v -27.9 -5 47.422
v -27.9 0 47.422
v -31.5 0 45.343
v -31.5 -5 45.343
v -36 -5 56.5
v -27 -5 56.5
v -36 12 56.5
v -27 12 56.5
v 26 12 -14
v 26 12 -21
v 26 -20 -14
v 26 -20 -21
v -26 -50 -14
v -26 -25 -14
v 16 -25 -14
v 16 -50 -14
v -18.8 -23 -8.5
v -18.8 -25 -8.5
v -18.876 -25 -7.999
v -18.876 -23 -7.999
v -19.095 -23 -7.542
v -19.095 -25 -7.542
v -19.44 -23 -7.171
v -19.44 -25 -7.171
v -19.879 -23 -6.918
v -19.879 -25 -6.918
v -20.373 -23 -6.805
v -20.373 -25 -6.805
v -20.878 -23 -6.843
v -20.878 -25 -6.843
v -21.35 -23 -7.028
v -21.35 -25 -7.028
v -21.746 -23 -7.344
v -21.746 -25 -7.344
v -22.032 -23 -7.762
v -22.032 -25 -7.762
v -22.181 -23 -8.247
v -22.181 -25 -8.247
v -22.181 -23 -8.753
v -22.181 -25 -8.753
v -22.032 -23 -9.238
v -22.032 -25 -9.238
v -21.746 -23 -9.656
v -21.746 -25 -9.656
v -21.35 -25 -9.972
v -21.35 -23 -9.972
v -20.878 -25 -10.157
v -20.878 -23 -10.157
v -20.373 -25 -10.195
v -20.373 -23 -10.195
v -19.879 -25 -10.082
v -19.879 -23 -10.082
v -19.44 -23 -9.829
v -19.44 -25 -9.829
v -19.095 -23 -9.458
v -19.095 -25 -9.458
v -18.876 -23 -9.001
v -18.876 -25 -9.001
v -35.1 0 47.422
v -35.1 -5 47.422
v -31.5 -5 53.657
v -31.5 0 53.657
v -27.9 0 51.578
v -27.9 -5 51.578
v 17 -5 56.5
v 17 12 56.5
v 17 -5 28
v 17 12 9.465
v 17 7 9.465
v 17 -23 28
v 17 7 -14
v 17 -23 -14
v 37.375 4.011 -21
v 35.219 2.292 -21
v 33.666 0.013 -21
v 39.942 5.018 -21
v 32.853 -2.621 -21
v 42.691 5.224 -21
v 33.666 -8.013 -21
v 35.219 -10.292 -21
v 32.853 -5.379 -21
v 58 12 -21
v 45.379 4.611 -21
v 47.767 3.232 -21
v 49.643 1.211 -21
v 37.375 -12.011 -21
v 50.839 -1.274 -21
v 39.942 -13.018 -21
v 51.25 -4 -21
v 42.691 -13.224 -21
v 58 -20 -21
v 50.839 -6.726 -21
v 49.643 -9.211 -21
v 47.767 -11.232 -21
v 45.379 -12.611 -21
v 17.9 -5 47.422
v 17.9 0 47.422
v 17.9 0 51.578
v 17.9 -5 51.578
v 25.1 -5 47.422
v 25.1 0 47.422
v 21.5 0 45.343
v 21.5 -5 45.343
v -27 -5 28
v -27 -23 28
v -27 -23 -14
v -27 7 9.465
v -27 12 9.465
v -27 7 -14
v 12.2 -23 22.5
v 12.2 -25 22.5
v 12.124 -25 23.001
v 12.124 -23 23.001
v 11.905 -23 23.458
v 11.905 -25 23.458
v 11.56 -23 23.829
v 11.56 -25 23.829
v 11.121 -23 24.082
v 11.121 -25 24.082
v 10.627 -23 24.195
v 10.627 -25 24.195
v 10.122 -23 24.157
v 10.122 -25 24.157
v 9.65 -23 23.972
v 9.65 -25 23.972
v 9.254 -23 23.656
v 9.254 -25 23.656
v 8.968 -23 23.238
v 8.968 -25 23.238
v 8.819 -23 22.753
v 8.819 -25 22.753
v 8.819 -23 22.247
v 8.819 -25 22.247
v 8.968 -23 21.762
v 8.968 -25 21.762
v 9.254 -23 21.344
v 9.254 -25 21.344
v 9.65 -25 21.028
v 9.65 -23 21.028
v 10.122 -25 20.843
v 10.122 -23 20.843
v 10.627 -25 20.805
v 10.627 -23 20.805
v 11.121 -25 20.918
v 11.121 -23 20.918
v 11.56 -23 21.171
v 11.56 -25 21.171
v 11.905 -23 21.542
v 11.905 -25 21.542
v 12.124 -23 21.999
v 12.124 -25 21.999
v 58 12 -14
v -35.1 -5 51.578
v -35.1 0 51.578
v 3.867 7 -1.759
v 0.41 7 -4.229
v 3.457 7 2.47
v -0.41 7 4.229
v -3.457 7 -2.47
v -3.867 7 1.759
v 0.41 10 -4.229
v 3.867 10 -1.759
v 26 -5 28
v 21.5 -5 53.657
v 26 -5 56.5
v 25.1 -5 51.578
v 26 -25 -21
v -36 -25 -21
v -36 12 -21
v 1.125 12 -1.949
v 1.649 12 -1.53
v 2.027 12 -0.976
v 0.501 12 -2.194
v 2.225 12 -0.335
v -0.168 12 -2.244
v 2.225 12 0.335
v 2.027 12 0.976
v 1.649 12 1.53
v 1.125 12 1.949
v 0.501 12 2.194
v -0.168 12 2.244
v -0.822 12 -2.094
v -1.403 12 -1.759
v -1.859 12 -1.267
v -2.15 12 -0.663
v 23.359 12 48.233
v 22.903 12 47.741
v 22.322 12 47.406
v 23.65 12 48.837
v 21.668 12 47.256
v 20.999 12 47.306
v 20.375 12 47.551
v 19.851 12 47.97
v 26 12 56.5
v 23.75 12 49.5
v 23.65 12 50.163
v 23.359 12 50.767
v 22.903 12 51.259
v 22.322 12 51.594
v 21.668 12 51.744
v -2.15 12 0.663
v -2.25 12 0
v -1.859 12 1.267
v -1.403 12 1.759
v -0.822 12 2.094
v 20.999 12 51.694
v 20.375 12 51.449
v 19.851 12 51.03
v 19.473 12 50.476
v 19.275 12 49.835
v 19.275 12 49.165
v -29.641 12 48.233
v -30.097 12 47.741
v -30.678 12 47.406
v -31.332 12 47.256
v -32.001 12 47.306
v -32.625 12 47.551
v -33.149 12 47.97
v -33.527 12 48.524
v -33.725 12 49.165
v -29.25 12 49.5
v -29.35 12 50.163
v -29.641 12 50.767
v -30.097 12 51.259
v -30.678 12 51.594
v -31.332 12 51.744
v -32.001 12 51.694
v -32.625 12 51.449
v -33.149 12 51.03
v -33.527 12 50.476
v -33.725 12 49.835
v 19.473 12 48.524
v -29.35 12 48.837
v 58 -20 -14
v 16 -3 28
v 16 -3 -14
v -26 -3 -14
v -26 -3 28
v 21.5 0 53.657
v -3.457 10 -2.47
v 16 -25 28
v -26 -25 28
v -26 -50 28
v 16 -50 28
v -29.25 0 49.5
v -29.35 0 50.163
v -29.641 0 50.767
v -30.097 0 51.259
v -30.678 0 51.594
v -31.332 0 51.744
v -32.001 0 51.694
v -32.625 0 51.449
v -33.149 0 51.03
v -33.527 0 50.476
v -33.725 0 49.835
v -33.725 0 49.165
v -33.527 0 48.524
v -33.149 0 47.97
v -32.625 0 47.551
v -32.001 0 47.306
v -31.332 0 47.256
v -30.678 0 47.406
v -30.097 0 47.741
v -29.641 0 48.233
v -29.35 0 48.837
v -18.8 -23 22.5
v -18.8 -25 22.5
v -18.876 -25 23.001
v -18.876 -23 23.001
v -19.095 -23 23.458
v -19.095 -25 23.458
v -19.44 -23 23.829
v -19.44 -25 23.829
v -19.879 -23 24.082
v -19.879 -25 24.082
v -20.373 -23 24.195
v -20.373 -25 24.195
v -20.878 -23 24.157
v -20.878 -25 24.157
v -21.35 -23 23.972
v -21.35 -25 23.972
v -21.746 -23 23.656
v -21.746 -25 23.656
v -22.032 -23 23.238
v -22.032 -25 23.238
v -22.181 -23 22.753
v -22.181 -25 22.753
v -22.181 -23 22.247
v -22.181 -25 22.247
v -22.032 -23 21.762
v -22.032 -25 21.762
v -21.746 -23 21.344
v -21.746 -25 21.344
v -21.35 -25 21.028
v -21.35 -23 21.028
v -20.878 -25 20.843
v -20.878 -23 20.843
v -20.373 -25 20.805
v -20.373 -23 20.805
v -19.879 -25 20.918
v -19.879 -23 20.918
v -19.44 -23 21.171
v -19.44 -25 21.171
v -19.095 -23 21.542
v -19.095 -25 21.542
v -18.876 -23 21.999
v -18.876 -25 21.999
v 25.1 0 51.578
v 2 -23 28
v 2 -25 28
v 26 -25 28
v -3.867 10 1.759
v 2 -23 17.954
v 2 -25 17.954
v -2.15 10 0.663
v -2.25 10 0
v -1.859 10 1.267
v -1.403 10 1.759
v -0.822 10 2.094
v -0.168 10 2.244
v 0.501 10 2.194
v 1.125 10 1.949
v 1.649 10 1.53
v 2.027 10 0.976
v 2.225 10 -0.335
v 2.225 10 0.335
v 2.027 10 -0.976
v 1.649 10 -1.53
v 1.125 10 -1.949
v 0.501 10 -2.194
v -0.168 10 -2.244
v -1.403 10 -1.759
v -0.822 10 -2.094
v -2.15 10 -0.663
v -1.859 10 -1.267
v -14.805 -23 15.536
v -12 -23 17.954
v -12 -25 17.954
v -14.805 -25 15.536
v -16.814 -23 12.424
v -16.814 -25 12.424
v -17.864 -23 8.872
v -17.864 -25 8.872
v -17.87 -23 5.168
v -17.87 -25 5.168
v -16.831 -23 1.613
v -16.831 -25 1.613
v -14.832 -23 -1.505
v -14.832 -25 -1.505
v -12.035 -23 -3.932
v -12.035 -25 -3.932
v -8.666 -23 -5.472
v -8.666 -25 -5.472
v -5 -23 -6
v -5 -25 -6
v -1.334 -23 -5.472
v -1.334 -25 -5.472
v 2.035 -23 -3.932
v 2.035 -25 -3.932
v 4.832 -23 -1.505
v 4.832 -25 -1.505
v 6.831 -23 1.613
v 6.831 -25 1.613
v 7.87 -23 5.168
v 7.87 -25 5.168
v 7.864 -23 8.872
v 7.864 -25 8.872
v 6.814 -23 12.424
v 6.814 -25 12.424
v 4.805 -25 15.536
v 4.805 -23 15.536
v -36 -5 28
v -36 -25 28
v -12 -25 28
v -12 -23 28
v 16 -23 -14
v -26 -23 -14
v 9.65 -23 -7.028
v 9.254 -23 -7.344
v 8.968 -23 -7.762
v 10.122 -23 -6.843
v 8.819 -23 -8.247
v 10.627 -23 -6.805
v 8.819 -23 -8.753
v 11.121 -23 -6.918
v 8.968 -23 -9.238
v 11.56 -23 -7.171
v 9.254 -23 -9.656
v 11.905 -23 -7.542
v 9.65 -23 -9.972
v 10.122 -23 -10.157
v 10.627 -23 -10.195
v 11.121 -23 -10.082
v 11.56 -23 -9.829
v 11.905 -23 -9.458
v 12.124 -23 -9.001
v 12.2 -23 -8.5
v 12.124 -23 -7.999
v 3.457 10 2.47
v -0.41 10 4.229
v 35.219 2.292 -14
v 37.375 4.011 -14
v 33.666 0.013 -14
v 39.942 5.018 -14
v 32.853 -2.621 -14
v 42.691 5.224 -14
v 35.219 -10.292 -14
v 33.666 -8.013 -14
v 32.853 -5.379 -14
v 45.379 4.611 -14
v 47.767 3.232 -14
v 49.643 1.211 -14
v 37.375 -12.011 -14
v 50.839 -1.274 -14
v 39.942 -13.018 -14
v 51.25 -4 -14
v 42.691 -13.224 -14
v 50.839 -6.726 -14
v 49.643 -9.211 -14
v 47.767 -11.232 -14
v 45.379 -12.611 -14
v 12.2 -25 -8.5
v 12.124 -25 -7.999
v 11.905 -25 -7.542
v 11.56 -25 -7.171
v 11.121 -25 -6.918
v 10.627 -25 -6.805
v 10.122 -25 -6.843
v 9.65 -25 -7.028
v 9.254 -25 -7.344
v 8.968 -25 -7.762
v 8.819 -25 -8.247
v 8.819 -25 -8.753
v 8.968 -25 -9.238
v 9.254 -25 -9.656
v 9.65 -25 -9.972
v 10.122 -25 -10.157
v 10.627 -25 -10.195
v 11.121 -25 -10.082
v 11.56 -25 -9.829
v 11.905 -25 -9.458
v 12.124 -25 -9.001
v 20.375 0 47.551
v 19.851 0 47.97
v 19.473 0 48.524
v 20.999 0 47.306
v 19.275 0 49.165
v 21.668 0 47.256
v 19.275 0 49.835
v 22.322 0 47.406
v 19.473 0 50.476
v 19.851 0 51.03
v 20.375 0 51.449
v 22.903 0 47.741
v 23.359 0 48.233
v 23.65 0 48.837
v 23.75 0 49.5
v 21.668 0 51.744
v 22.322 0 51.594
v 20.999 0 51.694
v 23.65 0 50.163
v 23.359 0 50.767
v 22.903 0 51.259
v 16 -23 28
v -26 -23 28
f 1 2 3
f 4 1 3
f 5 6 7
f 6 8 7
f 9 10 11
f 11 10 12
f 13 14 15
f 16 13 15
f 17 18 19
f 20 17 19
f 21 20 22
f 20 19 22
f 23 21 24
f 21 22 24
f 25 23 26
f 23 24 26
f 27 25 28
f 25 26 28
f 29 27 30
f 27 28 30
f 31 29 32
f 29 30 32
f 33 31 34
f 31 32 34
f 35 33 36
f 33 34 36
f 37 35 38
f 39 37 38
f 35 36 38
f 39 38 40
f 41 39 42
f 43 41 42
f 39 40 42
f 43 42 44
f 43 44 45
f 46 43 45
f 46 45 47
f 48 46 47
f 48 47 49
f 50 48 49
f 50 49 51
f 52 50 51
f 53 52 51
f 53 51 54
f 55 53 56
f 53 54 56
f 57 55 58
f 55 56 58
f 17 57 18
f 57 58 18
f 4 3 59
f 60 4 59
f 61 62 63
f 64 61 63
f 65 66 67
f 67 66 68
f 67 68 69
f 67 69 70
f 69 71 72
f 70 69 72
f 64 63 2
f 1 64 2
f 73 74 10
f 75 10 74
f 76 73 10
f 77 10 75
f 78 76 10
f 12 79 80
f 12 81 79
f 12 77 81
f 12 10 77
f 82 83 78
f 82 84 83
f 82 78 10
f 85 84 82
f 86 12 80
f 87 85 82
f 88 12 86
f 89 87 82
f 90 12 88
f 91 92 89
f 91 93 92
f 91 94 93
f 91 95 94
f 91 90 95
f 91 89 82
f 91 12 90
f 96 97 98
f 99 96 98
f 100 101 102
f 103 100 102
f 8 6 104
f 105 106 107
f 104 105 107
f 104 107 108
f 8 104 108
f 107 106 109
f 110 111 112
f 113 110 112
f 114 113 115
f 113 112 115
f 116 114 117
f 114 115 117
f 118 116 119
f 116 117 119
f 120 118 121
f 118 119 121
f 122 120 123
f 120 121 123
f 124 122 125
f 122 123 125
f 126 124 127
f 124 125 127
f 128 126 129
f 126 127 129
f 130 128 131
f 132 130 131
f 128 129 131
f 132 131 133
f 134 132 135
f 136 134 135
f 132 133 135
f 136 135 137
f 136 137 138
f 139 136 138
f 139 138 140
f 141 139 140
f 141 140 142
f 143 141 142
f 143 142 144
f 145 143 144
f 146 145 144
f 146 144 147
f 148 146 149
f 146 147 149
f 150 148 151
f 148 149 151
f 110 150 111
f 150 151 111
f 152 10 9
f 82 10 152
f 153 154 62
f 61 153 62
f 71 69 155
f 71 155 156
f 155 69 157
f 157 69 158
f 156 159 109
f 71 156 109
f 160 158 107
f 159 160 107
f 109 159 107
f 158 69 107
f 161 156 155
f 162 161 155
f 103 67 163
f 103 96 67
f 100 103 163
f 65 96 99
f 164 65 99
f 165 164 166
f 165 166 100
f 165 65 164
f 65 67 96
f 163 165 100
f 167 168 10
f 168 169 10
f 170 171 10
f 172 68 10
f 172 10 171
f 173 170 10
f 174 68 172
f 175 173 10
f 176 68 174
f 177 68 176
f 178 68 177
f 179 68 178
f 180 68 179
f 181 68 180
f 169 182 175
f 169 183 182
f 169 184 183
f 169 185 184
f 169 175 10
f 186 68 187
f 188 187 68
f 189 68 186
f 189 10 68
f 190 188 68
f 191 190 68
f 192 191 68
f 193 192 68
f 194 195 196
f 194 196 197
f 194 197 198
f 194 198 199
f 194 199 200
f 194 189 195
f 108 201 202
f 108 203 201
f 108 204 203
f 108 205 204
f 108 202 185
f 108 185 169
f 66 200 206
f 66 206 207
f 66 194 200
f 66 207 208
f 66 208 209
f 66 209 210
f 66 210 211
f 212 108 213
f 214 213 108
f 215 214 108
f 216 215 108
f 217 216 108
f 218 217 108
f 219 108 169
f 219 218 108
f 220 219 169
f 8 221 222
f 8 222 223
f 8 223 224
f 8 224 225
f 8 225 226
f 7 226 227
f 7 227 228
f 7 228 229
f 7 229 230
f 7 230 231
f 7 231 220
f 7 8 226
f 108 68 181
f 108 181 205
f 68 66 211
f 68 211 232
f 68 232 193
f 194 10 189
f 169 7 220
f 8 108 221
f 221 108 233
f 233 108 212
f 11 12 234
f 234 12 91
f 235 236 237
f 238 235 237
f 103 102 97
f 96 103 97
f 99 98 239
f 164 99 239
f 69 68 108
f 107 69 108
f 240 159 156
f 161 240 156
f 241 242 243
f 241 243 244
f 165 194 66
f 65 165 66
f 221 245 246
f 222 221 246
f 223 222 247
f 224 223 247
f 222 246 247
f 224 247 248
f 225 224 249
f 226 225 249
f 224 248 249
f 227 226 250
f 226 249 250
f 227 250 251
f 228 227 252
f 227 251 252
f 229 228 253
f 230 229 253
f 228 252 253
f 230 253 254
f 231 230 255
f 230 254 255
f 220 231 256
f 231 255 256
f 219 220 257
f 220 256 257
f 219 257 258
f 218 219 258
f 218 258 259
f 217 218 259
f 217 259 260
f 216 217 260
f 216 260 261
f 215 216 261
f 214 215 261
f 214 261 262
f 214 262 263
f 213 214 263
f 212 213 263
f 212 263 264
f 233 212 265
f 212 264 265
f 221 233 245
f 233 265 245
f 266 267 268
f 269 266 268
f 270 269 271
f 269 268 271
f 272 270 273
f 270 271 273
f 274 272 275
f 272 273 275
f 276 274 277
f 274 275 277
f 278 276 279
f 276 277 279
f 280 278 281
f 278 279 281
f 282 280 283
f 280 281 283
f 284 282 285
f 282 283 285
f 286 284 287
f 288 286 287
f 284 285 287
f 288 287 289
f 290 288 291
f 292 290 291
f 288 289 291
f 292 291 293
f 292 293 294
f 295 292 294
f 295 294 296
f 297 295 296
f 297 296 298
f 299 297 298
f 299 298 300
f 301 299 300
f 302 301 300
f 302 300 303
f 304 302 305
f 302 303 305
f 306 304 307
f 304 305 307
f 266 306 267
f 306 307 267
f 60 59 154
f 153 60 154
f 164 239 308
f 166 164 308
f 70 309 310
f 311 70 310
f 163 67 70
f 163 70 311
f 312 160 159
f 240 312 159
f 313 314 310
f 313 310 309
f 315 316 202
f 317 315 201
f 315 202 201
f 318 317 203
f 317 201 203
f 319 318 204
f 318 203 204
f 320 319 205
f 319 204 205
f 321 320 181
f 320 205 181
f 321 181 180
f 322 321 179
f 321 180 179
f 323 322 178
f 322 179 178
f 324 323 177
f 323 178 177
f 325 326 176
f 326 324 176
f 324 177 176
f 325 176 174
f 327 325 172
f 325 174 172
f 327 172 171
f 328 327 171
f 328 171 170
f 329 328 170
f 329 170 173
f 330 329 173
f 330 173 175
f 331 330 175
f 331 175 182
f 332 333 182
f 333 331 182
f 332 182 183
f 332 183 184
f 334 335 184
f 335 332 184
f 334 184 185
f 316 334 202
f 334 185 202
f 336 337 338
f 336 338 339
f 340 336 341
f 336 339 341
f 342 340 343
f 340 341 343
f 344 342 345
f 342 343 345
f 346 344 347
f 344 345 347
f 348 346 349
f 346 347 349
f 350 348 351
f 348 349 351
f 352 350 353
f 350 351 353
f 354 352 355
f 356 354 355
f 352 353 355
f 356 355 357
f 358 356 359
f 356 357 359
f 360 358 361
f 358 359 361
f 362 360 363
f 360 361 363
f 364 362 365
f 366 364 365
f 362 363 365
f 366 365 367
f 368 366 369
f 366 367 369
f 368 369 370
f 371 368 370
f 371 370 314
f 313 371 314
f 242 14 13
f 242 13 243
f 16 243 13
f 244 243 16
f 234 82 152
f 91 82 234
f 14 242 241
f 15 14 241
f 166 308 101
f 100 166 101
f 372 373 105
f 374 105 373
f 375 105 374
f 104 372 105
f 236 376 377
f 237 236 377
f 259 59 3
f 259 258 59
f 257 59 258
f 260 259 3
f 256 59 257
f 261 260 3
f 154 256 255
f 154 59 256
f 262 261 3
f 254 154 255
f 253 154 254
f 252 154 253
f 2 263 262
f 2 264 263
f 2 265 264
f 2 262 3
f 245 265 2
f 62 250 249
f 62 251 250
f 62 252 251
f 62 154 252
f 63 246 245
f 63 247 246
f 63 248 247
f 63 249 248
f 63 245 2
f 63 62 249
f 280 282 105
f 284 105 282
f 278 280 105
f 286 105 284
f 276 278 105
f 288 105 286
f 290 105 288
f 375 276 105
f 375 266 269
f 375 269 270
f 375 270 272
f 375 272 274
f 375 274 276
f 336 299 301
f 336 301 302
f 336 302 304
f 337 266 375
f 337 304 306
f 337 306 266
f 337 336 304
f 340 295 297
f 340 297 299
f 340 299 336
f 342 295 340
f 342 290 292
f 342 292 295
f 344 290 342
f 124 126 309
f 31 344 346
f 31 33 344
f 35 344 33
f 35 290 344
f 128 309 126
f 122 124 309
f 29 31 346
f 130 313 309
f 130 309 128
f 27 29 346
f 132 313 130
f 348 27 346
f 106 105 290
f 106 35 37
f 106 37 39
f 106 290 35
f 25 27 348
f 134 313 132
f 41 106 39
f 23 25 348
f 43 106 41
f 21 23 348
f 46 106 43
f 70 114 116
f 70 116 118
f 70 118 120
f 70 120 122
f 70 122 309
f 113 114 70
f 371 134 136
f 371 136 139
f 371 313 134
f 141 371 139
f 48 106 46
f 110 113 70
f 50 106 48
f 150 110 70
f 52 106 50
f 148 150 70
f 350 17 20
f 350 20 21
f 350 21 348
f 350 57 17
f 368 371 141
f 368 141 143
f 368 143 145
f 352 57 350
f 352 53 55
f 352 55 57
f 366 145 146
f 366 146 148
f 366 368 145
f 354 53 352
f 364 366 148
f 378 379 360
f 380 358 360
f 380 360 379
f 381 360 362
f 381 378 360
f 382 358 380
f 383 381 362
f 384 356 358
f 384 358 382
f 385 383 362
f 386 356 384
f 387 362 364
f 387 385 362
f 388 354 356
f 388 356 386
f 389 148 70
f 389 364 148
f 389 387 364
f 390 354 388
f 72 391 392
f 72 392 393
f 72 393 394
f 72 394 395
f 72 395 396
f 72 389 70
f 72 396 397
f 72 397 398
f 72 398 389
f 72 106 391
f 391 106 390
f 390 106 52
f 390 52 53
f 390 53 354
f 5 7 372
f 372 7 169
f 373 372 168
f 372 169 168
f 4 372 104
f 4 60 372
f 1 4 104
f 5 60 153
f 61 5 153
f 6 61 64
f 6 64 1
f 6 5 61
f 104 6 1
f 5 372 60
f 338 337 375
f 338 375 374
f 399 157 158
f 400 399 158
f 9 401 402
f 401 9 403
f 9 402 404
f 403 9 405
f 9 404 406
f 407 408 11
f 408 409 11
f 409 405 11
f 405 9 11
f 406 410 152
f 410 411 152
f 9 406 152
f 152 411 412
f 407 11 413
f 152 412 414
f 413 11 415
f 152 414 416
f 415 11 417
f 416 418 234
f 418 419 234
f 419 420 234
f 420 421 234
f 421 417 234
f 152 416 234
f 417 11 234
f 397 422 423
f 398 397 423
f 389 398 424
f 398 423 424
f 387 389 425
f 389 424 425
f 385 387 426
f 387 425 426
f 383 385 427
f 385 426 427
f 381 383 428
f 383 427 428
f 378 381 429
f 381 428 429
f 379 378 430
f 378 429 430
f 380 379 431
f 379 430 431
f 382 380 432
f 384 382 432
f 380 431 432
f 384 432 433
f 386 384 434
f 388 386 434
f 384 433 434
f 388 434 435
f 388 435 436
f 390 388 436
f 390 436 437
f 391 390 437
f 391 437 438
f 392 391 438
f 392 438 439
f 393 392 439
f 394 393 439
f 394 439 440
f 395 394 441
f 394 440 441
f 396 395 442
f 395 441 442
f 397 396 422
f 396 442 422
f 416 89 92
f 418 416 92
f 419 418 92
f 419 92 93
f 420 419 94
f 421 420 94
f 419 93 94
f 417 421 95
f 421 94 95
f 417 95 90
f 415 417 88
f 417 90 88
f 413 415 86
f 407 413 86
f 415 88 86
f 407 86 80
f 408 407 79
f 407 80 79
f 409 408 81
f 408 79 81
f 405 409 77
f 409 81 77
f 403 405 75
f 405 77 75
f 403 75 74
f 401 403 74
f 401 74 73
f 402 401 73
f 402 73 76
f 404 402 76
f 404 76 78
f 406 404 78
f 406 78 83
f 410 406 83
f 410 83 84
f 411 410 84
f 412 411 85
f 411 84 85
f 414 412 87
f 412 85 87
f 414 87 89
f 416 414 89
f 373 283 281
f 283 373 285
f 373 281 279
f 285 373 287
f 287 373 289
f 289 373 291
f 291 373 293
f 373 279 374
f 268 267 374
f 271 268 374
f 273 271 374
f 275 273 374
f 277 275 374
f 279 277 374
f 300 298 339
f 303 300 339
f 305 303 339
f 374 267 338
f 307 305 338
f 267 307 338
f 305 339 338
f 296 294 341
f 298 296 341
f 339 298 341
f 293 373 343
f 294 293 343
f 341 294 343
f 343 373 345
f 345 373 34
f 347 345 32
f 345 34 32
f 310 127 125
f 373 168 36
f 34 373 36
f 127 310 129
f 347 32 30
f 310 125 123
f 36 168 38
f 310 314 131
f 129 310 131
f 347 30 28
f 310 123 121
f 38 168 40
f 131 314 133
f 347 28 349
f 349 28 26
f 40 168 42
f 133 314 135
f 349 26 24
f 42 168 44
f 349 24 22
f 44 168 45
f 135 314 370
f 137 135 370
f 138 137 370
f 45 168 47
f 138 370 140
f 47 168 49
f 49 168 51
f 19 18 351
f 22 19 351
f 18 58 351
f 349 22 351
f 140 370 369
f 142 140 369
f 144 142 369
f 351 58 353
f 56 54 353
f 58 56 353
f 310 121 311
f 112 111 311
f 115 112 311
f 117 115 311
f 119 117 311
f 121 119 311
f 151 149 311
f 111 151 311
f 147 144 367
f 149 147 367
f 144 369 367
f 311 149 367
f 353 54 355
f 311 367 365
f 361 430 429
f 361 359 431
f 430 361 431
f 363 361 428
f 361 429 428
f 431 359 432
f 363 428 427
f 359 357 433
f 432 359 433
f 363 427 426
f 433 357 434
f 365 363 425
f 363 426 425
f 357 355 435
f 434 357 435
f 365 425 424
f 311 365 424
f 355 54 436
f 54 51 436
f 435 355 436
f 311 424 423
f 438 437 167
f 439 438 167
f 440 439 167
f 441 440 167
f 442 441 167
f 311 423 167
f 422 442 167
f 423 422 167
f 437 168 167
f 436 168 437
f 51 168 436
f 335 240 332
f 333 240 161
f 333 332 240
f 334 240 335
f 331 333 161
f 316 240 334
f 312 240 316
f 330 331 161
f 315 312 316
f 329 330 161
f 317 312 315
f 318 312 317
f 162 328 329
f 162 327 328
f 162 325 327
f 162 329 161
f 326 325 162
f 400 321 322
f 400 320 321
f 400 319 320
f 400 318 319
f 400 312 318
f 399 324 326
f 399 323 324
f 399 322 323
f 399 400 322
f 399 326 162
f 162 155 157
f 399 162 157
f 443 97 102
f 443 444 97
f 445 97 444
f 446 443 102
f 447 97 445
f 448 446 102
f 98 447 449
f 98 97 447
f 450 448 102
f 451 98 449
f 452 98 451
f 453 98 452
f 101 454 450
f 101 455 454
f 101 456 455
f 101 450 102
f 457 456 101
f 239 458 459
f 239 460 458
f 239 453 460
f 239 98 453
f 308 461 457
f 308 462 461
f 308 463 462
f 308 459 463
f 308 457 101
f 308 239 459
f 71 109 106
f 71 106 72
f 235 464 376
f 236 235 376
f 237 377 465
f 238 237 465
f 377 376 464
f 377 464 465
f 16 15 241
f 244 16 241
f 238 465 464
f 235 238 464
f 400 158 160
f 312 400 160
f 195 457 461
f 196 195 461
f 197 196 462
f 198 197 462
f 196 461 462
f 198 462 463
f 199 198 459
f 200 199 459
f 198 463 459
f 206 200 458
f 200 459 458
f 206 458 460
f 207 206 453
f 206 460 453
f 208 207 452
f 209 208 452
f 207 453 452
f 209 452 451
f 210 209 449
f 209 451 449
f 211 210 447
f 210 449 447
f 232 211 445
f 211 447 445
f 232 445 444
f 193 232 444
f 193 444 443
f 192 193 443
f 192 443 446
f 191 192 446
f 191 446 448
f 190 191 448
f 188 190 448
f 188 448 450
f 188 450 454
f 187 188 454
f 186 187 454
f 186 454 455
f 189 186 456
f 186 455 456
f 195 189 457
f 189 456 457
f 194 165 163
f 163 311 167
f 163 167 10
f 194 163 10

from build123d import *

# Parameters (mm, degrees)
F1_R      = 2.25
F2_DEPTH  = 12
F4_DEPTH  = 5
F5_W      = 44
F5_H      = 18
F5_H_2    = 2
F6_DEPTH  = 7
F7_DEPTH  = 42
F8_R      = 1.7
F8_R_2    = 13
F9_DEPTH  = 2
F11_REACH = 63.1431356237
F12_R     = 1.7
F13_DEPTH = 20
F14_W     = 42
F14_H     = 42
F14_R     = 1.7
F14_R_2   = 13
F15_DEPTH = 25
F16_W     = 32
F16_H     = 32
F16_R     = 9.25
F17_DEPTH = 7
F18_W     = 44
F18_H     = 23.4653228298
F18_R     = 2.25
F19_DEPTH = 5
F20_R     = 2.25
F21_DEPTH = 3


with BuildPart() as f2:
    # F1 (on Front) → F2 (new body)
    with BuildSketch(Plane.XZ):
        Polygon((-27, 56.5), (-36, 56.5), (-36, -21), (26, -21), (26, 56.5), (17, 56.5), (17, -14), (-27, -14), align=None)
        with Locations((-31.5, 49.5)):
            Circle(F1_R, mode=Mode.SUBTRACT)
        with Locations((21.5, 49.5)):
            Circle(F1_R, mode=Mode.SUBTRACT)
    extrude(amount=-F2_DEPTH)

    # F3 (on face) → F4 (join)
    with BuildSketch(Plane.XZ):
        Polygon((-27, -14), (-27, 56.5), (-36, 56.5), (-36, -21), (26, -21), (26, 56.5), (17, 56.5), (17, -14), align=None)
        Polygon((-31.5, 53.6569219382), (-27.9, 51.5784609691), (-27.9, 47.4215390309), (-31.5, 45.3430780618), (-35.1, 47.4215390309), (-35.1, 51.5784609691), align=None, mode=Mode.SUBTRACT)
        Polygon((21.5, 53.6569219382), (25.1, 51.5784609691), (25.1, 47.4215390309), (21.5, 45.3430780618), (17.9, 47.4215390309), (17.9, 51.5784609691), align=None, mode=Mode.SUBTRACT)
    extrude(amount=F4_DEPTH)

    # F5 (on face) → F6 (join, through all)
    with BuildSketch(Plane.XY.offset(-14)):
        with Locations((-5, -14)):
            Rectangle(F5_W, F5_H)
        with Locations((-5, -24)):
            Rectangle(F5_W, F5_H_2)
        Polygon((-27, -23), (-27, -5), (-36, -5), (-36, -25), (-27, -25), align=None)
        Polygon((26, -5), (17, -5), (17, -23), (17, -25), (26, -25), align=None)
    extrude(amount=-F6_DEPTH)

    # F5 (on face) → F7 (join)
    with BuildSketch(Plane.XY.offset(-14)):
        with Locations((-5, -24)):
            Rectangle(F5_W, F5_H_2)
        Polygon((-27, -23), (-27, -5), (-36, -5), (-36, -25), (-27, -25), align=None)
        Polygon((26, -5), (17, -5), (17, -23), (17, -25), (26, -25), align=None)
    extrude(amount=F7_DEPTH)

    # F8 (on face) → F9 (cut, through all)
    with BuildSketch(Plane.XZ.offset(25)):
        with Locations((-20.5, 22.5)):
            Circle(F8_R)
        with Locations((-5, 7)):
            Circle(F8_R_2)
        with Locations((-20.5, -8.5)):
            Circle(F8_R)
        with Locations((10.5, -8.5)):
            Circle(F8_R)
        with Locations((10.5, 22.5)):
            Circle(F8_R)
    extrude(amount=-F9_DEPTH, mode=Mode.SUBTRACT)

    f11_end = f2.faces().sort_by_distance((-18, -24, 7))[0]
    # F10 (on face) → F11 (cut, up to a face of the model that its end follows)
    with BuildSketch(Plane.XY.offset(28)):
        Polygon((2, -23), (-5, -23), (-12, -23), (-12, -25), (2, -25), align=None)
    f11_long = extrude(amount=-F11_REACH, mode=Mode.PRIVATE)
    add(split(f11_long, bisect_by=f11_end, keep=Keep.ALL, mode=Mode.PRIVATE).solids().sort_by_distance((-5, -24, 28))[0], mode=Mode.SUBTRACT)

    # F18 (on face) → F19 (join)
    with BuildSketch(Plane(origin=(0, 12, 0), x_dir=(-1, 0, 0), z_dir=(0, 1, 0))):
        with Locations((5, -2.2673385851)):
            Rectangle(F18_W, F18_H)
        Circle(F18_R, mode=Mode.SUBTRACT)
    extrude(amount=-F19_DEPTH)

    # F20 (on face) → F21 (cut)
    with BuildSketch(Plane.XZ.offset(-7)):
        Polygon((-0.410156085, 4.2290001548), (-3.8674996092, 1.7592944883), (-3.4573435242, -2.4697056666), (0.410156085, -4.2290001548), (3.8674996092, -1.7592944883), (3.4573435242, 2.4697056666), align=None)
        Circle(F20_R, mode=Mode.SUBTRACT)
    extrude(amount=-F21_DEPTH, mode=Mode.SUBTRACT)


with BuildPart() as f13:
    # F12 (on face) → F13 (new body)
    with BuildSketch(Plane(origin=(0, -23, 0), x_dir=(-1, 0, 0), z_dir=(0, 1, 0))):
        with BuildLine():
            Line((-16, -14), (26, -14))
            Line((26, -14), (26, 28))
            Line((26, 28), (12, 28))
            Line((12, 28), (12, 17.9544511501))
            ThreePointArc((12, 17.9544511501), (5, -6), (-2, 17.9544511501))
            Line((-2, 17.9544511501), (-2, 28))
            Line((-2, 28), (-16, 28))
            Line((-16, 28), (-16, -14))
        make_face()
        with Locations((-10.5, -8.5)):
            Circle(F12_R, mode=Mode.SUBTRACT)
        with Locations((20.5, -8.5)):
            Circle(F12_R, mode=Mode.SUBTRACT)
        with Locations((-10.5, 22.5)):
            Circle(F12_R, mode=Mode.SUBTRACT)
        with Locations((20.5, 22.5)):
            Circle(F12_R, mode=Mode.SUBTRACT)
        with BuildLine():
            Line((12, 17.9544511501), (12, 28))
            Line((12, 28), (-2, 28))
            Line((-2, 28), (-2, 17.9544511501))
            ThreePointArc((-2, 17.9544511501), (5, -6), (12, 17.9544511501))
        make_face()
        with Locations((-10.5, 22.5)):
            Circle(F12_R)
        with Locations((20.5, 22.5)):
            Circle(F12_R)
        with Locations((-10.5, -8.5)):
            Circle(F12_R)
        with Locations((20.5, -8.5)):
            Circle(F12_R)
    extrude(amount=F13_DEPTH)


with BuildPart() as f15:
    # F14 (on face) → F15 (new body)
    with BuildSketch(Plane.XZ.offset(25)):
        with Locations((-5, 7)):
            Rectangle(F14_W, F14_H)
        with Locations((-20.5, -8.5)):
            Circle(F14_R, mode=Mode.SUBTRACT)
        with Locations((10.5, -8.5)):
            Circle(F14_R, mode=Mode.SUBTRACT)
        with Locations((-20.5, 22.5)):
            Circle(F14_R, mode=Mode.SUBTRACT)
        with Locations((-5, 7)):
            Circle(F14_R_2, mode=Mode.SUBTRACT)
        with Locations((10.5, 22.5)):
            Circle(F14_R, mode=Mode.SUBTRACT)
    extrude(amount=F15_DEPTH)

    # F8 (on face) → F15, piece 2 (join)
    with BuildSketch(Plane.XZ.offset(25)):
        with Locations((-20.5, 22.5)):
            Circle(F8_R)
    extrude(amount=F15_DEPTH)

    # F8 (on face) → F15, piece 3 (join)
    with BuildSketch(Plane.XZ.offset(25)):
        with Locations((-5, 7)):
            Circle(F8_R_2)
    extrude(amount=F15_DEPTH)

    # F8 (on face) → F15, piece 4 (join)
    with BuildSketch(Plane.XZ.offset(25)):
        with Locations((-20.5, -8.5)):
            Circle(F8_R)
    extrude(amount=F15_DEPTH)

    # F8 (on face) → F15, piece 5 (join)
    with BuildSketch(Plane.XZ.offset(25)):
        with Locations((10.5, 22.5)):
            Circle(F8_R)
    extrude(amount=F15_DEPTH)

    # F8 (on face) → F15, piece 6 (join)
    with BuildSketch(Plane.XZ.offset(25)):
        with Locations((10.5, -8.5)):
            Circle(F8_R)
    extrude(amount=F15_DEPTH)


with BuildPart() as f17:
    # F16 (on face) → F17 (new body, through all)
    with BuildSketch(Plane(origin=(0, 0, -21), x_dir=(1, 0, 0), z_dir=(0, 0, -1))):
        with Locations((42, 4)):
            Rectangle(F16_W, F16_H)
        with Locations((42, 4)):
            Circle(F16_R, mode=Mode.SUBTRACT)
    extrude(amount=-F17_DEPTH)


solid = Compound([f2.part, f13.part, f15.part, f17.part])
